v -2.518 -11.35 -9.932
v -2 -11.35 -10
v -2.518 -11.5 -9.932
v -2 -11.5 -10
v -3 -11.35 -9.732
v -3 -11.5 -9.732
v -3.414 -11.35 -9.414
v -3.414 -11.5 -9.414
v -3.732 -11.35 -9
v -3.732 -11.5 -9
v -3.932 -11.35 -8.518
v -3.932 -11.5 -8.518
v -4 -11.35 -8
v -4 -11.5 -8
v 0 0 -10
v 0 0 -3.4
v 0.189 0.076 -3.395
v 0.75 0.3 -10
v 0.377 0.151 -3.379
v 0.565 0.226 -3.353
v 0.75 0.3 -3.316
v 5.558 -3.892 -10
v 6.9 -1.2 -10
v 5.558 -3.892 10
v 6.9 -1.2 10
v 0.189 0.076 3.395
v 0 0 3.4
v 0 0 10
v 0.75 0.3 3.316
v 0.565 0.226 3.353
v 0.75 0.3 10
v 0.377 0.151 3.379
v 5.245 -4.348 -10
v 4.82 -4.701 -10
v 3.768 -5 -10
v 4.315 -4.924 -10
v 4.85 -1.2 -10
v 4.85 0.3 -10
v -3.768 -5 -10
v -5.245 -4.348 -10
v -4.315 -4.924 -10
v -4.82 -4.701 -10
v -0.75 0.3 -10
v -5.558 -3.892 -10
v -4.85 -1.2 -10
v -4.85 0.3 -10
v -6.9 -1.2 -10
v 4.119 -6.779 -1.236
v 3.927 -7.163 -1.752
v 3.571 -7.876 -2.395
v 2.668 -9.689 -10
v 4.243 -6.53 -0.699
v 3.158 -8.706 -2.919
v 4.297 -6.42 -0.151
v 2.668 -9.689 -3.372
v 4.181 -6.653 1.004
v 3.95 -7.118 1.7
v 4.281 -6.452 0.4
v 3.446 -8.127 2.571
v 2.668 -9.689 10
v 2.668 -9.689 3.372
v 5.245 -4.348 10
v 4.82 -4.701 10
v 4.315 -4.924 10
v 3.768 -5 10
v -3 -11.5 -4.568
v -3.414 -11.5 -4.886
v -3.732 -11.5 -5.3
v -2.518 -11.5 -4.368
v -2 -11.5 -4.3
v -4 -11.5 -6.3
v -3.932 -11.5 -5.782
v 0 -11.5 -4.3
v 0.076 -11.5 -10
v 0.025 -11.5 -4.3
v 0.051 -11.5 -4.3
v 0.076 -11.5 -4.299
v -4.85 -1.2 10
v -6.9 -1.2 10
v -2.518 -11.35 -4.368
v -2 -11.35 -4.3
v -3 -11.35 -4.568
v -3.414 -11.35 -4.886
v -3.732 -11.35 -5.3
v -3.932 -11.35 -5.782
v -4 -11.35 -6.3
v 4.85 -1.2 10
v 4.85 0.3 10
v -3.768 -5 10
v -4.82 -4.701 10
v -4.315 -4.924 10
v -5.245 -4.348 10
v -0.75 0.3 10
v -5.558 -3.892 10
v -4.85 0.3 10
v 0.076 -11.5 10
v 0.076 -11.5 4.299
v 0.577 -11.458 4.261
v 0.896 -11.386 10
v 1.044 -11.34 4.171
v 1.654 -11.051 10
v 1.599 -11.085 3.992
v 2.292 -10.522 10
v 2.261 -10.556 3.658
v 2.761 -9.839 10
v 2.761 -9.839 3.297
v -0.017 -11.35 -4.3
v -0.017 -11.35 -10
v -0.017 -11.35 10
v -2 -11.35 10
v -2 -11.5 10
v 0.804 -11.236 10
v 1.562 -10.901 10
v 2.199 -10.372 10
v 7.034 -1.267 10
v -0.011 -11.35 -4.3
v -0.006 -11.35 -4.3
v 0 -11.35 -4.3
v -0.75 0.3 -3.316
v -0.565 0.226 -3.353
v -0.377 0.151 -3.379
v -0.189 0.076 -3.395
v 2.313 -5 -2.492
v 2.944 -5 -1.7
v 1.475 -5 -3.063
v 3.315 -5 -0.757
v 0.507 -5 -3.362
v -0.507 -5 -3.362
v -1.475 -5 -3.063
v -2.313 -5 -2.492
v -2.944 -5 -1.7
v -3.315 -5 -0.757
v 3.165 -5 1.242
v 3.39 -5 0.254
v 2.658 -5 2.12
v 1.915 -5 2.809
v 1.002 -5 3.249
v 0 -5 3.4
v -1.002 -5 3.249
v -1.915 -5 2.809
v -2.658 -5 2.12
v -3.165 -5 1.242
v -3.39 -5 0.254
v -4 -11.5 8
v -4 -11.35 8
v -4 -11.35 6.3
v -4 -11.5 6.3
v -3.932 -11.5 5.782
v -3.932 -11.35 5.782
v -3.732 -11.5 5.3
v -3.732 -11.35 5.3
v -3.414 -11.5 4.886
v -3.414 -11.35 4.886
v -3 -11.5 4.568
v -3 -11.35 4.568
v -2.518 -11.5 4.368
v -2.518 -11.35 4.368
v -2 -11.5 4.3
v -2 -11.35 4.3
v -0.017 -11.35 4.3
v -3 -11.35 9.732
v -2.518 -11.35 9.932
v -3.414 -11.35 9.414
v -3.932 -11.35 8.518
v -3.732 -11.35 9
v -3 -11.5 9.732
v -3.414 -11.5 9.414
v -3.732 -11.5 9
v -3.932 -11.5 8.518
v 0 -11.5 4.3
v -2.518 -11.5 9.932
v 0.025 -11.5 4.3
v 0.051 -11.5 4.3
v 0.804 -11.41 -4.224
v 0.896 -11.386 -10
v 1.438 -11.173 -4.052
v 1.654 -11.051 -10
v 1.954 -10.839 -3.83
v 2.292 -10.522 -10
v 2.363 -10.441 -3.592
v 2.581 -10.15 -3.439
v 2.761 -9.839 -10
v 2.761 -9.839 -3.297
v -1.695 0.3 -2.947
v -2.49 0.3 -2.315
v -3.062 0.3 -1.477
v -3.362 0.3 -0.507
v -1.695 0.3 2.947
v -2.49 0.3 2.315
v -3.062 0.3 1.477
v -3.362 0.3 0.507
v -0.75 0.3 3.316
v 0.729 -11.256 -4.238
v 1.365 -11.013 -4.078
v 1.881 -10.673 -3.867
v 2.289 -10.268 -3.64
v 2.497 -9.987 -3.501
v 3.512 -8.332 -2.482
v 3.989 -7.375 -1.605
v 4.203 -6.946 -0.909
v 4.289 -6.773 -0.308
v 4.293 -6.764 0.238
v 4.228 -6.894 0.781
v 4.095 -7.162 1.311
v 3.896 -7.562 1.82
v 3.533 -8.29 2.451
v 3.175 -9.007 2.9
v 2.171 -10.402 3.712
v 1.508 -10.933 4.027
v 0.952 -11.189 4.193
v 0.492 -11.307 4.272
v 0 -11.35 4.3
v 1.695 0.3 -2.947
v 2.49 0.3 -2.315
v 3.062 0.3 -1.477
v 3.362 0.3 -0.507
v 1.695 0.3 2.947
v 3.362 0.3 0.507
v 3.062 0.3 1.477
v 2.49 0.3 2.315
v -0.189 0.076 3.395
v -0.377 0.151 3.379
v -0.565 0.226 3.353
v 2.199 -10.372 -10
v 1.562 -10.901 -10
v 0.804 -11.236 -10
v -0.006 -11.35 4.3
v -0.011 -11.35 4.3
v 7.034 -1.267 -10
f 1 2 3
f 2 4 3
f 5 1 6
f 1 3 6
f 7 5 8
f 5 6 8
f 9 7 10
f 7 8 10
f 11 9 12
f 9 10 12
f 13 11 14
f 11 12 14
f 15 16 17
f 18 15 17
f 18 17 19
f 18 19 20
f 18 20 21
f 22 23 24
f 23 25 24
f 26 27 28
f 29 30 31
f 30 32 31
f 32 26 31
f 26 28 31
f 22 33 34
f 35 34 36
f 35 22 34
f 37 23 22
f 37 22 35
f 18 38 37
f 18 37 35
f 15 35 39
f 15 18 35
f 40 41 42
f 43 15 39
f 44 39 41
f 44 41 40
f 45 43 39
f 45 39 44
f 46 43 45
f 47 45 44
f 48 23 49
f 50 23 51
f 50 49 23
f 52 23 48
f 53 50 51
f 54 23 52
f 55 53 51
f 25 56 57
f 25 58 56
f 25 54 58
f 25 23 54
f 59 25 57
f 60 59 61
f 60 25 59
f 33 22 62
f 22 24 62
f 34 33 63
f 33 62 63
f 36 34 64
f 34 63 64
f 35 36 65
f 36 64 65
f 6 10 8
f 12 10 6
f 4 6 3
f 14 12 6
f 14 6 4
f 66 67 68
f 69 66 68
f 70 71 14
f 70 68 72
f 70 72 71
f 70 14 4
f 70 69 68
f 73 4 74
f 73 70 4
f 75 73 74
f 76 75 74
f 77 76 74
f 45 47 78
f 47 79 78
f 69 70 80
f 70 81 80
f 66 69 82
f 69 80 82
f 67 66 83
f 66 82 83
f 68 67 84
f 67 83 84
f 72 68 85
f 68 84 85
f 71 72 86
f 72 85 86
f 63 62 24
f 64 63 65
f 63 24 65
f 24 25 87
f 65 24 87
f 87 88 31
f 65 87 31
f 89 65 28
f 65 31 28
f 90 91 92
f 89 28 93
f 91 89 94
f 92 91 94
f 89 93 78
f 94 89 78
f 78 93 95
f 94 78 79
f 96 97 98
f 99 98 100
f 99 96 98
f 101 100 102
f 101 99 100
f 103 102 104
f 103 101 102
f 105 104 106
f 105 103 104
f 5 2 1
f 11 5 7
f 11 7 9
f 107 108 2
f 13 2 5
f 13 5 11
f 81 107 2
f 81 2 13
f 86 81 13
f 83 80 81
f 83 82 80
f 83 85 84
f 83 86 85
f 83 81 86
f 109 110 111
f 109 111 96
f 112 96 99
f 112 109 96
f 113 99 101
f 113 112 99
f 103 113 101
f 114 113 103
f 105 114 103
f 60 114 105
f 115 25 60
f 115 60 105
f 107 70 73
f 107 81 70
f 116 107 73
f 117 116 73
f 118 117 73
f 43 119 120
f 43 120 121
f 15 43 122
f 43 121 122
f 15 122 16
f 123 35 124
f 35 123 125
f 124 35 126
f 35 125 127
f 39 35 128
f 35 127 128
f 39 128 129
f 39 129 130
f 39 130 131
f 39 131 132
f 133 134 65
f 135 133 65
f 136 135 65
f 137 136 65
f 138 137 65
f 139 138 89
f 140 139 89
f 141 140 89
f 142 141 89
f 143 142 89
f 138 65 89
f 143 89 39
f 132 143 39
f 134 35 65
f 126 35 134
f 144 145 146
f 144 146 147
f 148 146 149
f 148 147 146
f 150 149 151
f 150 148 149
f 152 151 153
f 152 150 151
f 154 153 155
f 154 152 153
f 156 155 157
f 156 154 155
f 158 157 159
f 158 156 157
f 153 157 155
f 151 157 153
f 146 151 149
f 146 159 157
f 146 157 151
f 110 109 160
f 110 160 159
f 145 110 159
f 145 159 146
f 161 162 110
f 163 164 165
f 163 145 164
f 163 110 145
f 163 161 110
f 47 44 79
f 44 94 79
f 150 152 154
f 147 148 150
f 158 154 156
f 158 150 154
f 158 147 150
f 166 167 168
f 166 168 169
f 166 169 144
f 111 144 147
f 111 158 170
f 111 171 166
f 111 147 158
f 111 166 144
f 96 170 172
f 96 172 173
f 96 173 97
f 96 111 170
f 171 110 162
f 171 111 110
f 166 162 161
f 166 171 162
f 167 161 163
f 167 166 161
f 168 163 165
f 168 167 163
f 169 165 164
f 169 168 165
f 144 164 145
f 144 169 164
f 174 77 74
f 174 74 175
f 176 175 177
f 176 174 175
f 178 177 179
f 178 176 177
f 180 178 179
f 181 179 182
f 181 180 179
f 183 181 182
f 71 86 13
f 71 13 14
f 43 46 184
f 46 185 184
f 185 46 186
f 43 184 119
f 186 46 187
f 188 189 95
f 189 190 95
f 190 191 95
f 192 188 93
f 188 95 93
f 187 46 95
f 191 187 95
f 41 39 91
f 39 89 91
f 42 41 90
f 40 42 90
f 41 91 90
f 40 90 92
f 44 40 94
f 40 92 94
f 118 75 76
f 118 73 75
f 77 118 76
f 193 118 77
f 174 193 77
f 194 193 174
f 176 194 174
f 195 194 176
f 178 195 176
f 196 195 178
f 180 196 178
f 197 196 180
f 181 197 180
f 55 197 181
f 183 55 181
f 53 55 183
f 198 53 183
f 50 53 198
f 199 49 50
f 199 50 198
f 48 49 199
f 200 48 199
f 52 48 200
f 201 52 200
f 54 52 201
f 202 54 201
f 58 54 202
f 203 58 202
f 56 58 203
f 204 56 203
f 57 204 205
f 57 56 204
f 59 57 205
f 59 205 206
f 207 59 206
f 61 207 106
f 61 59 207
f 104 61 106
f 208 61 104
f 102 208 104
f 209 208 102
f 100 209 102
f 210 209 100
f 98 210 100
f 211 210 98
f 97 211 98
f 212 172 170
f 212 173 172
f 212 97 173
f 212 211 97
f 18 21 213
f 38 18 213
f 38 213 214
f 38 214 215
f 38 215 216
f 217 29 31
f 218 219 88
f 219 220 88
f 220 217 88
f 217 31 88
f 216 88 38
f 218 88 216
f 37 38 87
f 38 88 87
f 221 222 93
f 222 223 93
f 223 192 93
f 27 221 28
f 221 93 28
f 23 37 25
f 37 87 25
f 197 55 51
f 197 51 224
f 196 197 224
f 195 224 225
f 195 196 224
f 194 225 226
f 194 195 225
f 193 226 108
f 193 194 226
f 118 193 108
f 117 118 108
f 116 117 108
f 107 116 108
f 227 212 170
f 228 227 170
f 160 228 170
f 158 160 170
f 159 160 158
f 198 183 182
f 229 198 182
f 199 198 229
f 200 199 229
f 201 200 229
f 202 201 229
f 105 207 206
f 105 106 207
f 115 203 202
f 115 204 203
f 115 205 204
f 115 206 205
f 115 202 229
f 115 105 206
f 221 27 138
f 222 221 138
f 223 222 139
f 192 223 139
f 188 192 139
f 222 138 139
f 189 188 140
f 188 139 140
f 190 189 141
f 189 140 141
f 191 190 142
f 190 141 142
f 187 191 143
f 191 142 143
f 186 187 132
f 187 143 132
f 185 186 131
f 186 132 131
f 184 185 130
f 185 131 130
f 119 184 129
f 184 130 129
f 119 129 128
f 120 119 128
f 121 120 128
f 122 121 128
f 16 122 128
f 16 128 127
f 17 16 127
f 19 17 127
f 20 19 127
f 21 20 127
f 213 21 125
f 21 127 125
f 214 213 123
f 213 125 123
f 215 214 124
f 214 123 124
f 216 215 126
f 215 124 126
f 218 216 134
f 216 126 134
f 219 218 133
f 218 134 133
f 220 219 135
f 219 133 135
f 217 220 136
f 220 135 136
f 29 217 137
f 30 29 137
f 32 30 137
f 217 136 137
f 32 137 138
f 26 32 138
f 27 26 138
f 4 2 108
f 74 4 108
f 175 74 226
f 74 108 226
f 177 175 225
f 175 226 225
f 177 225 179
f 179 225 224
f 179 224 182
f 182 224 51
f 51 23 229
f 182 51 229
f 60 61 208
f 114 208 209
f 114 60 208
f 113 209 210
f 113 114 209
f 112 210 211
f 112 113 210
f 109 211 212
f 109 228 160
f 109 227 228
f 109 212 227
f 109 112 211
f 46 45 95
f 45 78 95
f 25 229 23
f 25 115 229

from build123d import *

# Parameters (mm, degrees)
EXTRUDE_1_DEPTH     = 10
EXTRUDE_2_DEPTH     = 10
CUT_EXTRUDE_1_DEPTH = 20
FILLET_1_R          = 2
SKETCH_4_W          = 3.4
SKETCH_4_H          = 11.8


with BuildPart() as part:
    # Эскиз1 → Бобышка-Вытянуть1 (new body, symmetric)
    with BuildSketch(Plane.XY):
        with BuildLine():
            Line((0, 0), (0.75, 0.3))
            Line((0.75, 0.3), (4.85, 0.3))
            Line((4.85, 0.3), (4.85, -1.2))
            Line((4.85, -1.2), (6.9, -1.2))
            Line((6.9, -1.2), (5.557621059, -3.892395626))
            ThreePointArc((5.557621059, -3.892395626), (4.820180183, -4.70070445), (3.767752336, -5))
            Line((3.767752336, -5), (-3.767752336, -5))
            ThreePointArc((-3.767752336, -5), (-4.820180183, -4.70070445), (-5.557621059, -3.892395626))
            Line((-5.557621059, -3.892395626), (-6.9, -1.2))
            Line((-6.9, -1.2), (-4.85, -1.2))
            Line((-4.85, -1.2), (-4.85, 0.3))
            Line((-4.85, 0.3), (-0.75, 0.3))
            Line((-0.75, 0.3), (0, 0))
        make_face()
    extrude(amount=EXTRUDE_1_DEPTH, both=True)

    # Эскиз4 → Отверстие обработанное метчиком M81 (revolve, cut)
    with BuildSketch(Plane(origin=(0, 0.3, 0), x_dir=(0, 0, 1), z_dir=(1, 0, 0))):
        with Locations((1.7, 5.9)):
            Rectangle(SKETCH_4_W, SKETCH_4_H)
    revolve(axis=Axis((0, 6.65, 0), (0, -1, 0)), mode=Mode.SUBTRACT)


with BuildPart() as body_2:
    # Эскиз2 → Бобышка-Вытянуть2 (new body, symmetric)
    with BuildSketch(Plane.XY):
        with BuildLine():
            Line((6.9, -1.2), (2.667743433, -9.688593439))
            ThreePointArc((2.667743433, -9.688593439), (1.561582119, -10.901056675), (-0.017059652, -11.35))
            Line((-0.017059652, -11.35), (-4, -11.35))
            Line((-4, -11.35), (-4, -11.5))
            Line((-4, -11.5), (0.075763165, -11.5))
            ThreePointArc((0.075763165, -11.5), (1.654404936, -11.051056675), (2.760566249, -9.838593439))
            Line((2.760566249, -9.838593439), (7.034240154, -1.266929672))
            Line((7.034240154, -1.266929672), (6.9, -1.2))
        make_face()
    extrude(amount=EXTRUDE_2_DEPTH, both=True)

    # Эскиз3 → Вырез-Вытянуть1 (cut)
    with BuildSketch(Plane.XZ.offset(5)):
        with BuildLine():
            Line((0, 4.3), (-5.557621059, 4.3))
            Line((-5.557621059, 4.3), (-5.557621059, -4.3))
            Line((-5.557621059, -4.3), (0, -4.3))
            ThreePointArc((0, -4.3), (4.3, 0), (0, 4.3))
        make_face()
    extrude(amount=CUT_EXTRUDE_1_DEPTH, mode=Mode.SUBTRACT)

    # Скругление1
    fillet_1_edges = [body_2.edges().sort_by_distance(p)[0] for p in [
        (-4, -11.425, 10),
        (-4, -11.425, 4.3),
        (-4, -11.425, -4.3),
        (-4, -11.425, -10),
    ]]
    fillet(fillet_1_edges, radius=FILLET_1_R)


solid = Compound([part.part, body_2.part])
